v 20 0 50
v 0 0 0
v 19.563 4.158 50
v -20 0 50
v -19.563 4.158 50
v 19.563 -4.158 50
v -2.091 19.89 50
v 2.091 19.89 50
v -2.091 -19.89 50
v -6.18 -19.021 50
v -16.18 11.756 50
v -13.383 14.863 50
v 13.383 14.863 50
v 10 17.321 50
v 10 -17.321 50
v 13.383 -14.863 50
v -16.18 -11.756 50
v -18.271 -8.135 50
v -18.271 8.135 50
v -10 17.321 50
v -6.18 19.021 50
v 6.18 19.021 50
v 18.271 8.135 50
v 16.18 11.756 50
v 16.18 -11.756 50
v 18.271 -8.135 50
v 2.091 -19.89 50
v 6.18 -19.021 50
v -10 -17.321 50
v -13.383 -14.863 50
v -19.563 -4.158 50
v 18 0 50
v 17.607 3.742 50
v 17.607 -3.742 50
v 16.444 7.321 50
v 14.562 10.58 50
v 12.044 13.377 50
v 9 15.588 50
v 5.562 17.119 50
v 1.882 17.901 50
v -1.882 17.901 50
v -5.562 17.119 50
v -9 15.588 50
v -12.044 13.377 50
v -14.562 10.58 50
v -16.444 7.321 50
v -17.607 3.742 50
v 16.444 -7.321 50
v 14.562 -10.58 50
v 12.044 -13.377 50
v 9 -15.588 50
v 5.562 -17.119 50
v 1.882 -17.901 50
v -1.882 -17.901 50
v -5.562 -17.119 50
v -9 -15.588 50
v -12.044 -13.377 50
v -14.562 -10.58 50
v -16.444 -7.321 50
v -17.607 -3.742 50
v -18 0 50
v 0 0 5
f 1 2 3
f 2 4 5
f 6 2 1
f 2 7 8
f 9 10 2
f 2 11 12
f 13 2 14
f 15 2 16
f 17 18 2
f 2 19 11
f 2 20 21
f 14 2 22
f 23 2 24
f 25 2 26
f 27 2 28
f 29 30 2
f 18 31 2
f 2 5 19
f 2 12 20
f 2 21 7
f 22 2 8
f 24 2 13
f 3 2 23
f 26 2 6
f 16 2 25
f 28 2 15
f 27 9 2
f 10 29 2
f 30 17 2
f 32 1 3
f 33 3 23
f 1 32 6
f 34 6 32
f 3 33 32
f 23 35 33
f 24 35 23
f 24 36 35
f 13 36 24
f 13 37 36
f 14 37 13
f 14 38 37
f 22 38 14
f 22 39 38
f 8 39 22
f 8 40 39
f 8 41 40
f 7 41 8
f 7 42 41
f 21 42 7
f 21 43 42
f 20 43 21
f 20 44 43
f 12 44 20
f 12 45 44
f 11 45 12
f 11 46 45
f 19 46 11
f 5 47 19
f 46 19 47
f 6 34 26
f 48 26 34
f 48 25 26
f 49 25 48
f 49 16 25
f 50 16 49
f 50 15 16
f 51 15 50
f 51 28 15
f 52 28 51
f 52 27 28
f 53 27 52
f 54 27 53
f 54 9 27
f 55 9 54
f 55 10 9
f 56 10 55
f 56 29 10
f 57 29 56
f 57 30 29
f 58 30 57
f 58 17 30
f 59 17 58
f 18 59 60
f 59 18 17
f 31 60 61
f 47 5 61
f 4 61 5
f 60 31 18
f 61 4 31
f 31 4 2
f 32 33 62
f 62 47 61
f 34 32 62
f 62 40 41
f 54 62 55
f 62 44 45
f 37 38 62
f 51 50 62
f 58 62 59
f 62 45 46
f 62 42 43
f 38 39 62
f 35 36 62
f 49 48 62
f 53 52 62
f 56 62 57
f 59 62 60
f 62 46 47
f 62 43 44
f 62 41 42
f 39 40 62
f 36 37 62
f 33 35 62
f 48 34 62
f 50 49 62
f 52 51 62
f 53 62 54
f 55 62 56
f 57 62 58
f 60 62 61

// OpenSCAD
difference() {
  cylinder(50, 0, 20);
  translate([0, 0, 5]) cylinder(50, 0, 20);
}
